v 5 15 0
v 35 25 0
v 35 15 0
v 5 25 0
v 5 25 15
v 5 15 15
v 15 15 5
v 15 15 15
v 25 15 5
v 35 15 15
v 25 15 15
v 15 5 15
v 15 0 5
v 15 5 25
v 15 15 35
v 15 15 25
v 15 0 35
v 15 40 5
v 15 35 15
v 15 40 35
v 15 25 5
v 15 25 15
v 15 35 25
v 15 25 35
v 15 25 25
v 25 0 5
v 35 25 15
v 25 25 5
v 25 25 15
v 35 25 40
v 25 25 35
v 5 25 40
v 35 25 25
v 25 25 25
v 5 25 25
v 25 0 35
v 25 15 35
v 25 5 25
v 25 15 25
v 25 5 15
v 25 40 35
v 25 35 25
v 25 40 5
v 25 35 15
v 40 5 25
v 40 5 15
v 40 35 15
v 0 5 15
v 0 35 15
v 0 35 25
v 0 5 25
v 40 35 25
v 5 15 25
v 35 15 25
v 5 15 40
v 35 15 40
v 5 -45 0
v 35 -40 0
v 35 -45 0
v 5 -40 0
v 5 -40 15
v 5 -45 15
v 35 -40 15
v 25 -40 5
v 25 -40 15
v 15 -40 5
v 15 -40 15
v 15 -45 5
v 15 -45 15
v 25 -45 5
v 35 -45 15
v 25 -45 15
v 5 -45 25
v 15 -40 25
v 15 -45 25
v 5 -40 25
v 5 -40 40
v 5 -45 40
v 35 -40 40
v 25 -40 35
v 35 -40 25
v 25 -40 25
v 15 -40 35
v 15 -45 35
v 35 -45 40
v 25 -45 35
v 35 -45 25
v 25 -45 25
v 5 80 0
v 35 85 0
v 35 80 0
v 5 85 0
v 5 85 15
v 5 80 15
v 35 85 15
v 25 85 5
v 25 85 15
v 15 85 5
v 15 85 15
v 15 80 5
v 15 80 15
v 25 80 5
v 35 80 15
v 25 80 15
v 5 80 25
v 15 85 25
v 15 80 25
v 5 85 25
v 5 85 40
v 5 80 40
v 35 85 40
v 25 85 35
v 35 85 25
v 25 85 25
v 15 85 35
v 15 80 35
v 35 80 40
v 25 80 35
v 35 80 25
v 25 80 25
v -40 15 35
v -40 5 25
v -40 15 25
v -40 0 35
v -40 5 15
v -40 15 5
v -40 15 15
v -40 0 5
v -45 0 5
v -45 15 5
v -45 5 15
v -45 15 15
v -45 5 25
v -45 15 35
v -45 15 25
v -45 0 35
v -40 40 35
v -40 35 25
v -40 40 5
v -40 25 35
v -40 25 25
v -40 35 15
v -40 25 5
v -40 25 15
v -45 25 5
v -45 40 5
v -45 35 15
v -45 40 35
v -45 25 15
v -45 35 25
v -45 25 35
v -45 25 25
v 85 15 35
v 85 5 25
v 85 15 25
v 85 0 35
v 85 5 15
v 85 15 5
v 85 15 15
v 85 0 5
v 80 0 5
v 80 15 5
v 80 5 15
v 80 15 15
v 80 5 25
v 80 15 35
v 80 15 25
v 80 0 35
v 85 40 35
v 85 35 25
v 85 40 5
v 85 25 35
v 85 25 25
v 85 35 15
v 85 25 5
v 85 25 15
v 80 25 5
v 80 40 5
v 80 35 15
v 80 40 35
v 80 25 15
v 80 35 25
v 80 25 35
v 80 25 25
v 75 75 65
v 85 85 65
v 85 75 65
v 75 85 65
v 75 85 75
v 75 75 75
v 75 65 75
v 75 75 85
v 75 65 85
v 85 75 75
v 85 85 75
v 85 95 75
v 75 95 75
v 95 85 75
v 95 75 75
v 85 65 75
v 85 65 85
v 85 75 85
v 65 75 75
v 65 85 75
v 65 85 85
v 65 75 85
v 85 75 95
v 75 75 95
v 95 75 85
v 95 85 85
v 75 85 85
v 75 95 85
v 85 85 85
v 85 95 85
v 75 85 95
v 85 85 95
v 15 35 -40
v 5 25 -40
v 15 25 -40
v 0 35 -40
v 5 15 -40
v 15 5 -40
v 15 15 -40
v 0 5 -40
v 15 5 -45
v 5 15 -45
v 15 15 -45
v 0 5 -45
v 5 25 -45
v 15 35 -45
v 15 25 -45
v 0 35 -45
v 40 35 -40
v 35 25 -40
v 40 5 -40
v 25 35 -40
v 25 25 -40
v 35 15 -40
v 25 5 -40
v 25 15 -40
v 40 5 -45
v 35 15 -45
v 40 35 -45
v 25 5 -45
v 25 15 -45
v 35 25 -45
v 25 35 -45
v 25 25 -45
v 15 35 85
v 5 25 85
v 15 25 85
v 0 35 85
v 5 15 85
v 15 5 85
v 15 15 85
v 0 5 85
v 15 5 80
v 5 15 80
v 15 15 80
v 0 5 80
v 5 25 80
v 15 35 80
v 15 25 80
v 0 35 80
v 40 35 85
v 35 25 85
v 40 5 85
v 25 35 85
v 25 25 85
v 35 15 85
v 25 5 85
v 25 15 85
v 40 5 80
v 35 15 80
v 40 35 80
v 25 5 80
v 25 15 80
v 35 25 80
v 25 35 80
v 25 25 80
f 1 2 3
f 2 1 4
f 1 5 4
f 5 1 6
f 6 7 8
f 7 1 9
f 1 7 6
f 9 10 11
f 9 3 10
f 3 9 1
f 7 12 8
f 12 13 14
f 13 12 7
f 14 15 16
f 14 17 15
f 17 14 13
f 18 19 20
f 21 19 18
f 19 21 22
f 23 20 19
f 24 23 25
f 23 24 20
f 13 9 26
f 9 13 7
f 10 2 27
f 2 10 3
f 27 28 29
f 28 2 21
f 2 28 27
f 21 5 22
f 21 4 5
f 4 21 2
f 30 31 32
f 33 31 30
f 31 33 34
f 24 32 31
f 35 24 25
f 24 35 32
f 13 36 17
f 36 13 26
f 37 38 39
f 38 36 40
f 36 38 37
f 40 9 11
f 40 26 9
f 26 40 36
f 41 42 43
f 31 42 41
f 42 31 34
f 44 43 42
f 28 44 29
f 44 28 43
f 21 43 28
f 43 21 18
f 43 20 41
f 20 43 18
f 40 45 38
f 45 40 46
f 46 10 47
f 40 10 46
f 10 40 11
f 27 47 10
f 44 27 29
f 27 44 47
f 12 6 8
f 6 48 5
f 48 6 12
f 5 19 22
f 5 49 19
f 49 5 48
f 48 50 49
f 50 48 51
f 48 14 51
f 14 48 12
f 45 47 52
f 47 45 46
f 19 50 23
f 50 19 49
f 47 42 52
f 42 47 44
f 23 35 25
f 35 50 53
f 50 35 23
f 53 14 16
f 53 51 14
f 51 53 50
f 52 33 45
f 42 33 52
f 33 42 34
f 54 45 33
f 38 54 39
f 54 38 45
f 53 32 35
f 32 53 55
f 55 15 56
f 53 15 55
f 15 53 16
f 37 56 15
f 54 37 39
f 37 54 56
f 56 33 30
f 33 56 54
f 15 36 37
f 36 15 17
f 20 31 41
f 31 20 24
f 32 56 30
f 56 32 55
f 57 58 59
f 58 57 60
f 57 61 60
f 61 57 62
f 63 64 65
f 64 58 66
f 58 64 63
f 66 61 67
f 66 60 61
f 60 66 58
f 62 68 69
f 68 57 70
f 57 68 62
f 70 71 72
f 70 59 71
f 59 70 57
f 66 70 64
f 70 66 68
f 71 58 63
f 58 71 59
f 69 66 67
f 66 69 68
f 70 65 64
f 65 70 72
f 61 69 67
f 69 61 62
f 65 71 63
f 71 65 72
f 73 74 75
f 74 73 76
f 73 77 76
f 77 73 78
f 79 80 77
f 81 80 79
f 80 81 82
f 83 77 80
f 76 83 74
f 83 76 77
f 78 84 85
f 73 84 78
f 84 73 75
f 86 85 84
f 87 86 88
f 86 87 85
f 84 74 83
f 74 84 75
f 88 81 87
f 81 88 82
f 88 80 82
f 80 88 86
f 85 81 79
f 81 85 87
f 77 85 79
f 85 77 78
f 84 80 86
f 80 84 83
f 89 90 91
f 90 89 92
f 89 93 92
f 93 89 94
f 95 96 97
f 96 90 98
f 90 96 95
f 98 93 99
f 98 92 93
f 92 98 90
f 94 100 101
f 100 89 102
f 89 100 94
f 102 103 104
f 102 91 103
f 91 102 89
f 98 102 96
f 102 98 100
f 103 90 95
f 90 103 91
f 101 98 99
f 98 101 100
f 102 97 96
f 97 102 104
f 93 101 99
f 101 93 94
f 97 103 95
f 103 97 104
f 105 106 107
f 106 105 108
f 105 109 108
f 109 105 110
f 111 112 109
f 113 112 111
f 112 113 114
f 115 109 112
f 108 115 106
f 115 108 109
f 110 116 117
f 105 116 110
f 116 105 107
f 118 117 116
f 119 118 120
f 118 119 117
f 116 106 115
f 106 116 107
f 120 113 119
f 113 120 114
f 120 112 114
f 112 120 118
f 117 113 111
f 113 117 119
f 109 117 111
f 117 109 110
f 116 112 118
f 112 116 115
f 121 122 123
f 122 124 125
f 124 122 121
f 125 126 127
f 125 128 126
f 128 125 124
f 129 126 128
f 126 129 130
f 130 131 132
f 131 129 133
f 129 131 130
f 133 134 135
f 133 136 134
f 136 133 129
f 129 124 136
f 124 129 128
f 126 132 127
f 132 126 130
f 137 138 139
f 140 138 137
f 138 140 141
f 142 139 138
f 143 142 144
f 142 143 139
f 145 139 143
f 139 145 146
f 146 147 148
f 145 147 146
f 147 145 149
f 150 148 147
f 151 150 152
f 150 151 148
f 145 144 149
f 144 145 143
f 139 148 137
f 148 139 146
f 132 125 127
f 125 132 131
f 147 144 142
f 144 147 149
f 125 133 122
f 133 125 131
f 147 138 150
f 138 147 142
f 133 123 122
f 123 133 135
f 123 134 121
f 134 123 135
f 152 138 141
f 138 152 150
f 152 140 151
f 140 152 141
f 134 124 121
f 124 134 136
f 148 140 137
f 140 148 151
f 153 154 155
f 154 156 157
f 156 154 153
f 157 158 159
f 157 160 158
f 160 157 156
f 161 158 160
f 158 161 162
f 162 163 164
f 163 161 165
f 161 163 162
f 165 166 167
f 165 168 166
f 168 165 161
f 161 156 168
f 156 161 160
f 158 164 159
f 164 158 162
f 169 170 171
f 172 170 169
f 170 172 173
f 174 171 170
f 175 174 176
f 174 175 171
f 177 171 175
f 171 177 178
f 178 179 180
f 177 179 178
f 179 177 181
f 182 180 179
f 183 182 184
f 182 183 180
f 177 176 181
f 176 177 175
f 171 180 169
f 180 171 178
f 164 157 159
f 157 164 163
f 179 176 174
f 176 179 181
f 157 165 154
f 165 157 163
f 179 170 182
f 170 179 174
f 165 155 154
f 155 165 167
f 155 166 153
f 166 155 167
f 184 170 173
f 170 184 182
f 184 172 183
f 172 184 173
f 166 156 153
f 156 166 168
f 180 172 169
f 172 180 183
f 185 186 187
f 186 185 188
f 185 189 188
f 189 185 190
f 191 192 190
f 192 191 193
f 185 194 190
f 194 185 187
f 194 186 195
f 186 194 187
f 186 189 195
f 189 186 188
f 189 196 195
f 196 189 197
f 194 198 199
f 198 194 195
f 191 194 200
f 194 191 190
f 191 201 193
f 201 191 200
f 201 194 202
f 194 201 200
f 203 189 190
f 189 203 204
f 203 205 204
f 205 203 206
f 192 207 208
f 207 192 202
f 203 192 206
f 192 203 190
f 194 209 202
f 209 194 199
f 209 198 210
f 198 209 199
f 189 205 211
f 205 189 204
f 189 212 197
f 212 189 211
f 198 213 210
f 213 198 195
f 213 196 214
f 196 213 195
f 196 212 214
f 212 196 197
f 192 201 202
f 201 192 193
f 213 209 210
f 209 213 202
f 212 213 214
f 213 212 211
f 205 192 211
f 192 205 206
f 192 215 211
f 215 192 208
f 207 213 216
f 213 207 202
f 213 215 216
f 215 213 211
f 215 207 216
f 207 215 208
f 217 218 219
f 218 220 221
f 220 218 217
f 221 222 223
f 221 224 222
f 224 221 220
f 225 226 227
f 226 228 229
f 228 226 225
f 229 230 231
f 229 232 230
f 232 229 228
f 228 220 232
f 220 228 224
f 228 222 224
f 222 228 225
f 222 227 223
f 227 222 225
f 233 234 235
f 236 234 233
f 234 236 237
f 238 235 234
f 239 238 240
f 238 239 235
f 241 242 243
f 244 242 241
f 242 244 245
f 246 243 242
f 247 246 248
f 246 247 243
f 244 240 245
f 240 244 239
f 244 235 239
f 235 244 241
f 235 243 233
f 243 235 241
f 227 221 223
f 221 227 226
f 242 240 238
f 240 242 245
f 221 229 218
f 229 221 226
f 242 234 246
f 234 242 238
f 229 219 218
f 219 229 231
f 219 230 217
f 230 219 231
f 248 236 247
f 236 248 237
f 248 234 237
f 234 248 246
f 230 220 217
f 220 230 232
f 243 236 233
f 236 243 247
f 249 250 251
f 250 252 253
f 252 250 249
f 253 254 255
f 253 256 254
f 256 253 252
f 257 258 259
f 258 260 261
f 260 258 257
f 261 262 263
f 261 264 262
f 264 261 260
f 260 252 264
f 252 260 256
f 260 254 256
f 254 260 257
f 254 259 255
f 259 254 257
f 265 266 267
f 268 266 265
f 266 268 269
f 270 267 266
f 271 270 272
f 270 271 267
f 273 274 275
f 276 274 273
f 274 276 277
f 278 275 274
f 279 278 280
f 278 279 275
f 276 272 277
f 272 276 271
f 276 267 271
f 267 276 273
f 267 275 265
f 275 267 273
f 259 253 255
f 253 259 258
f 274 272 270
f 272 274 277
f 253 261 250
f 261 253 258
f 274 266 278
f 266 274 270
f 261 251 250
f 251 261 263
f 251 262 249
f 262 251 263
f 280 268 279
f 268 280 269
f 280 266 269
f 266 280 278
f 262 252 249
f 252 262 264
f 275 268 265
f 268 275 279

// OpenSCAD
// SCAD file for Six Piece Burr Puzzle
// 整体模型
union() {
  translate([5, 15, 0]) color([0, 0.8, 0, 0.85]) cube([5, 5, 5]);
  translate([10, 15, 0]) color([0, 0.8, 0, 0.85]) cube([5, 5, 5]);
  translate([15, 15, 0]) color([0, 0.8, 0, 0.85]) cube([5, 5, 5]);
  translate([20, 15, 0]) color([0, 0.8, 0, 0.85]) cube([5, 5, 5]);
  translate([25, 15, 0]) color([0, 0.8, 0, 0.85]) cube([5, 5, 5]);
  translate([30, 15, 0]) color([0, 0.8, 0, 0.85]) cube([5, 5, 5]);
  translate([5, 20, 0]) color([1, 0, 0, 0.85]) cube([5, 5, 5]);
  translate([10, 20, 0]) color([1, 0, 0, 0.85]) cube([5, 5, 5]);
  translate([15, 20, 0]) color([1, 0, 0, 0.85]) cube([5, 5, 5]);
  translate([20, 20, 0]) color([1, 0, 0, 0.85]) cube([5, 5, 5]);
  translate([25, 20, 0]) color([1, 0, 0, 0.85]) cube([5, 5, 5]);
  translate([30, 20, 0]) color([1, 0, 0, 0.85]) cube([5, 5, 5]);
  translate([15, 0, 5]) color([0.6, 0, 1, 0.85]) cube([5, 5, 5]);
  translate([20, 0, 5]) color([1, 0.4, 0, 0.85]) cube([5, 5, 5]);
  translate([15, 5, 5]) color([0.6, 0, 1, 0.85]) cube([5, 5, 5]);
  translate([20, 5, 5]) color([1, 0.4, 0, 0.85]) cube([5, 5, 5]);
  translate([15, 10, 5]) color([0.6, 0, 1, 0.85]) cube([5, 5, 5]);
  translate([20, 10, 5]) color([1, 0.4, 0, 0.85]) cube([5, 5, 5]);
  translate([5, 15, 5]) color([0, 0.8, 0, 0.85]) cube([5, 5, 5]);
  translate([10, 15, 5]) color([0, 0.8, 0, 0.85]) cube([5, 5, 5]);
  translate([15, 15, 5]) color([0.8, 0.8, 0.8, 0.85]) cube([5, 5, 5]);
  translate([20, 15, 5]) color([0.8, 0.8, 0.8, 0.85]) cube([5, 5, 5]);
  translate([25, 15, 5]) color([0, 0.8, 0, 0.85]) cube([5, 5, 5]);
  translate([30, 15, 5]) color([0, 0.8, 0, 0.85]) cube([5, 5, 5]);
  translate([5, 20, 5]) color([1, 0, 0, 0.85]) cube([5, 5, 5]);
  translate([10, 20, 5]) color([1, 0, 0, 0.85]) cube([5, 5, 5]);
  translate([15, 20, 5]) color([0.8, 0.8, 0.8, 0.85]) cube([5, 5, 5]);
  translate([20, 20, 5]) color([0.8, 0.8, 0.8, 0.85]) cube([5, 5, 5]);
  translate([25, 20, 5]) color([1, 0, 0, 0.85]) cube([5, 5, 5]);
  translate([30, 20, 5]) color([1, 0, 0, 0.85]) cube([5, 5, 5]);
  translate([15, 25, 5]) color([0.6, 0, 1, 0.85]) cube([5, 5, 5]);
  translate([20, 25, 5]) color([1, 0.4, 0, 0.85]) cube([5, 5, 5]);
  translate([15, 30, 5]) color([0.6, 0, 1, 0.85]) cube([5, 5, 5]);
  translate([20, 30, 5]) color([1, 0.4, 0, 0.85]) cube([5, 5, 5]);
  translate([15, 35, 5]) color([0.6, 0, 1, 0.85]) cube([5, 5, 5]);
  translate([20, 35, 5]) color([1, 0.4, 0, 0.85]) cube([5, 5, 5]);
  translate([15, 0, 10]) color([0.6, 0, 1, 0.85]) cube([5, 5, 5]);
  translate([20, 0, 10]) color([1, 0.4, 0, 0.85]) cube([5, 5, 5]);
  translate([15, 5, 10]) color([0.6, 0, 1, 0.85]) cube([5, 5, 5]);
  translate([20, 5, 10]) color([1, 0.4, 0, 0.85]) cube([5, 5, 5]);
  translate([15, 10, 10]) color([0.6, 0, 1, 0.85]) cube([5, 5, 5]);
  translate([20, 10, 10]) color([1, 0.4, 0, 0.85]) cube([5, 5, 5]);
  translate([5, 15, 10]) color([0, 0.8, 0, 0.85]) cube([5, 5, 5]);
  translate([10, 15, 10]) color([0, 0.8, 0, 0.85]) cube([5, 5, 5]);
  translate([15, 15, 10]) color([0.8, 0.8, 0.8, 0.85]) cube([5, 5, 5]);
  translate([20, 15, 10]) color([0.8, 0.8, 0.8, 0.85]) cube([5, 5, 5]);
  translate([25, 15, 10]) color([0, 0.8, 0, 0.85]) cube([5, 5, 5]);
  translate([30, 15, 10]) color([0, 0.8, 0, 0.85]) cube([5, 5, 5]);
  translate([5, 20, 10]) color([1, 0, 0, 0.85]) cube([5, 5, 5]);
  translate([10, 20, 10]) color([1, 0, 0, 0.85]) cube([5, 5, 5]);
  translate([15, 20, 10]) color([0.8, 0.8, 0.8, 0.85]) cube([5, 5, 5]);
  translate([20, 20, 10]) color([0.8, 0.8, 0.8, 0.85]) cube([5, 5, 5]);
  translate([25, 20, 10]) color([1, 0, 0, 0.85]) cube([5, 5, 5]);
  translate([30, 20, 10]) color([1, 0, 0, 0.85]) cube([5, 5, 5]);
  translate([15, 25, 10]) color([0.6, 0, 1, 0.85]) cube([5, 5, 5]);
  translate([20, 25, 10]) color([1, 0.4, 0, 0.85]) cube([5, 5, 5]);
  translate([15, 30, 10]) color([0.6, 0, 1, 0.85]) cube([5, 5, 5]);
  translate([20, 30, 10]) color([1, 0.4, 0, 0.85]) cube([5, 5, 5]);
  translate([15, 35, 10]) color([0.6, 0, 1, 0.85]) cube([5, 5, 5]);
  translate([20, 35, 10]) color([1, 0.4, 0, 0.85]) cube([5, 5, 5]);
  translate([15, 0, 15]) color([0.6, 0, 1, 0.85]) cube([5, 5, 5]);
  translate([20, 0, 15]) color([1, 0.4, 0, 0.85]) cube([5, 5, 5]);
  translate([0, 5, 15]) color([1, 0.8, 0, 0.85]) cube([5, 5, 5]);
  translate([5, 5, 15]) color([1, 0.8, 0, 0.85]) cube([5, 5, 5]);
  translate([10, 5, 15]) color([1, 0.8, 0, 0.85]) cube([5, 5, 5]);
  translate([15, 5, 15]) color([0.8, 0.8, 0.8, 0.85]) cube([5, 5, 5]);
  translate([20, 5, 15]) color([0.8, 0.8, 0.8, 0.85]) cube([5, 5, 5]);
  translate([25, 5, 15]) color([1, 0.8, 0, 0.85]) cube([5, 5, 5]);
  translate([30, 5, 15]) color([1, 0.8, 0, 0.85]) cube([5, 5, 5]);
  translate([35, 5, 15]) color([1, 0.8, 0, 0.85]) cube([5, 5, 5]);
  translate([0, 10, 15]) color([1, 0.8, 0, 0.85]) cube([5, 5, 5]);
  translate([5, 10, 15]) color([1, 0.8, 0, 0.85]) cube([5, 5, 5]);
  translate([10, 10, 15]) color([1, 0.8, 0, 0.85]) cube([5, 5, 5]);
  translate([15, 10, 15]) color([0.8, 0.8, 0.8, 0.85]) cube([5, 5, 5]);
  translate([20, 10, 15]) color([0.8, 0.8, 0.8, 0.85]) cube([5, 5, 5]);
  translate([25, 10, 15]) color([1, 0.8, 0, 0.85]) cube([5, 5, 5]);
  translate([30, 10, 15]) color([1, 0.8, 0, 0.85]) cube([5, 5, 5]);
  translate([35, 10, 15]) color([1, 0.8, 0, 0.85]) cube([5, 5, 5]);
  translate([0, 15, 15]) color([1, 0.8, 0, 0.85]) cube([5, 5, 5]);
  translate([5, 15, 15]) color([0.8, 0.8, 0.8, 0.85]) cube([5, 5, 5]);
  translate([10, 15, 15]) color([0.8, 0.8, 0.8, 0.85]) cube([5, 5, 5]);
  translate([15, 15, 15]) color([0.8, 0.8, 0.8, 0.85]) cube([5, 5, 5]);
  translate([20, 15, 15]) color([0.8, 0.8, 0.8, 0.85]) cube([5, 5, 5]);
  translate([25, 15, 15]) color([0.8, 0.8, 0.8, 0.85]) cube([5, 5, 5]);
  translate([30, 15, 15]) color([0.8, 0.8, 0.8, 0.85]) cube([5, 5, 5]);
  translate([35, 15, 15]) color([1, 0.8, 0, 0.85]) cube([5, 5, 5]);
  translate([0, 20, 15]) color([1, 0.8, 0, 0.85]) cube([5, 5, 5]);
  translate([5, 20, 15]) color([0.8, 0.8, 0.8, 0.85]) cube([5, 5, 5]);
  translate([10, 20, 15]) color([0.8, 0.8, 0.8, 0.85]) cube([5, 5, 5]);
  translate([15, 20, 15]) color([0.8, 0.8, 0.8, 0.85]) cube([5, 5, 5]);
  translate([20, 20, 15]) color([0.8, 0.8, 0.8, 0.85]) cube([5, 5, 5]);
  translate([25, 20, 15]) color([0.8, 0.8, 0.8, 0.85]) cube([5, 5, 5]);
  translate([30, 20, 15]) color([0.8, 0.8, 0.8, 0.85]) cube([5, 5, 5]);
  translate([35, 20, 15]) color([1, 0.8, 0, 0.85]) cube([5, 5, 5]);
  translate([0, 25, 15]) color([1, 0.8, 0, 0.85]) cube([5, 5, 5]);
  translate([5, 25, 15]) color([1, 0.8, 0, 0.85]) cube([5, 5, 5]);
  translate([10, 25, 15]) color([1, 0.8, 0, 0.85]) cube([5, 5, 5]);
  translate([15, 25, 15]) color([0.8, 0.8, 0.8, 0.85]) cube([5, 5, 5]);
  translate([20, 25, 15]) color([0.8, 0.8, 0.8, 0.85]) cube([5, 5, 5]);
  translate([25, 25, 15]) color([1, 0.8, 0, 0.85]) cube([5, 5, 5]);
  translate([30, 25, 15]) color([1, 0.8, 0, 0.85]) cube([5, 5, 5]);
  translate([35, 25, 15]) color([1, 0.8, 0, 0.85]) cube([5, 5, 5]);
  translate([0, 30, 15]) color([1, 0.8, 0, 0.85]) cube([5, 5, 5]);
  translate([5, 30, 15]) color([1, 0.8, 0, 0.85]) cube([5, 5, 5]);
  translate([10, 30, 15]) color([1, 0.8, 0, 0.85]) cube([5, 5, 5]);
  translate([15, 30, 15]) color([0.8, 0.8, 0.8, 0.85]) cube([5, 5, 5]);
  translate([20, 30, 15]) color([0.8, 0.8, 0.8, 0.85]) cube([5, 5, 5]);
  translate([25, 30, 15]) color([1, 0.8, 0, 0.85]) cube([5, 5, 5]);
  translate([30, 30, 15]) color([1, 0.8, 0, 0.85]) cube([5, 5, 5]);
  translate([35, 30, 15]) color([1, 0.8, 0, 0.85]) cube([5, 5, 5]);
  translate([15, 35, 15]) color([0.6, 0, 1, 0.85]) cube([5, 5, 5]);
  translate([20, 35, 15]) color([1, 0.4, 0, 0.85]) cube([5, 5, 5]);
  translate([15, 0, 20]) color([0.6, 0, 1, 0.85]) cube([5, 5, 5]);
  translate([20, 0, 20]) color([1, 0.4, 0, 0.85]) cube([5, 5, 5]);
  translate([0, 5, 20]) color([0, 0.4, 1, 0.85]) cube([5, 5, 5]);
  translate([5, 5, 20]) color([0, 0.4, 1, 0.85]) cube([5, 5, 5]);
  translate([10, 5, 20]) color([0, 0.4, 1, 0.85]) cube([5, 5, 5]);
  translate([15, 5, 20]) color([0.8, 0.8, 0.8, 0.85]) cube([5, 5, 5]);
  translate([20, 5, 20]) color([0.8, 0.8, 0.8, 0.85]) cube([5, 5, 5]);
  translate([25, 5, 20]) color([0, 0.4, 1, 0.85]) cube([5, 5, 5]);
  translate([30, 5, 20]) color([0, 0.4, 1, 0.85]) cube([5, 5, 5]);
  translate([35, 5, 20]) color([0, 0.4, 1, 0.85]) cube([5, 5, 5]);
  translate([0, 10, 20]) color([0, 0.4, 1, 0.85]) cube([5, 5, 5]);
  translate([5, 10, 20]) color([0, 0.4, 1, 0.85]) cube([5, 5, 5]);
  translate([10, 10, 20]) color([0, 0.4, 1, 0.85]) cube([5, 5, 5]);
  translate([15, 10, 20]) color([0.8, 0.8, 0.8, 0.85]) cube([5, 5, 5]);
  translate([20, 10, 20]) color([0.8, 0.8, 0.8, 0.85]) cube([5, 5, 5]);
  translate([25, 10, 20]) color([0, 0.4, 1, 0.85]) cube([5, 5, 5]);
  translate([30, 10, 20]) color([0, 0.4, 1, 0.85]) cube([5, 5, 5]);
  translate([35, 10, 20]) color([0, 0.4, 1, 0.85]) cube([5, 5, 5]);
  translate([0, 15, 20]) color([0, 0.4, 1, 0.85]) cube([5, 5, 5]);
  translate([5, 15, 20]) color([0.8, 0.8, 0.8, 0.85]) cube([5, 5, 5]);
  translate([10, 15, 20]) color([0.8, 0.8, 0.8, 0.85]) cube([5, 5, 5]);
  translate([15, 15, 20]) color([0.8, 0.8, 0.8, 0.85]) cube([5, 5, 5]);
  translate([20, 15, 20]) color([0.8, 0.8, 0.8, 0.85]) cube([5, 5, 5]);
  translate([25, 15, 20]) color([0.8, 0.8, 0.8, 0.85]) cube([5, 5, 5]);
  translate([30, 15, 20]) color([0.8, 0.8, 0.8, 0.85]) cube([5, 5, 5]);
  translate([35, 15, 20]) color([0, 0.4, 1, 0.85]) cube([5, 5, 5]);
  translate([0, 20, 20]) color([0, 0.4, 1, 0.85]) cube([5, 5, 5]);
  translate([5, 20, 20]) color([0.8, 0.8, 0.8, 0.85]) cube([5, 5, 5]);
  translate([10, 20, 20]) color([0.8, 0.8, 0.8, 0.85]) cube([5, 5, 5]);
  translate([15, 20, 20]) color([0.8, 0.8, 0.8, 0.85]) cube([5, 5, 5]);
  translate([20, 20, 20]) color([0.8, 0.8, 0.8, 0.85]) cube([5, 5, 5]);
  translate([25, 20, 20]) color([0.8, 0.8, 0.8, 0.85]) cube([5, 5, 5]);
  translate([30, 20, 20]) color([0.8, 0.8, 0.8, 0.85]) cube([5, 5, 5]);
  translate([35, 20, 20]) color([0, 0.4, 1, 0.85]) cube([5, 5, 5]);
  translate([0, 25, 20]) color([0, 0.4, 1, 0.85]) cube([5, 5, 5]);
  translate([5, 25, 20]) color([0, 0.4, 1, 0.85]) cube([5, 5, 5]);
  translate([10, 25, 20]) color([0, 0.4, 1, 0.85]) cube([5, 5, 5]);
  translate([15, 25, 20]) color([0.8, 0.8, 0.8, 0.85]) cube([5, 5, 5]);
  translate([20, 25, 20]) color([0.8, 0.8, 0.8, 0.85]) cube([5, 5, 5]);
  translate([25, 25, 20]) color([0, 0.4, 1, 0.85]) cube([5, 5, 5]);
  translate([30, 25, 20]) color([0, 0.4, 1, 0.85]) cube([5, 5, 5]);
  translate([35, 25, 20]) color([0, 0.4, 1, 0.85]) cube([5, 5, 5]);
  translate([0, 30, 20]) color([0, 0.4, 1, 0.85]) cube([5, 5, 5]);
  translate([5, 30, 20]) color([0, 0.4, 1, 0.85]) cube([5, 5, 5]);
  translate([10, 30, 20]) color([0, 0.4, 1, 0.85]) cube([5, 5, 5]);
  translate([15, 30, 20]) color([0.8, 0.8, 0.8, 0.85]) cube([5, 5, 5]);
  translate([20, 30, 20]) color([0.8, 0.8, 0.8, 0.85]) cube([5, 5, 5]);
  translate([25, 30, 20]) color([0, 0.4, 1, 0.85]) cube([5, 5, 5]);
  translate([30, 30, 20]) color([0, 0.4, 1, 0.85]) cube([5, 5, 5]);
  translate([35, 30, 20]) color([0, 0.4, 1, 0.85]) cube([5, 5, 5]);
  translate([15, 35, 20]) color([0.6, 0, 1, 0.85]) cube([5, 5, 5]);
  translate([20, 35, 20]) color([1, 0.4, 0, 0.85]) cube([5, 5, 5]);
  translate([15, 0, 25]) color([0.6, 0, 1, 0.85]) cube([5, 5, 5]);
  translate([20, 0, 25]) color([1, 0.4, 0, 0.85]) cube([5, 5, 5]);
  translate([15, 5, 25]) color([0.6, 0, 1, 0.85]) cube([5, 5, 5]);
  translate([20, 5, 25]) color([1, 0.4, 0, 0.85]) cube([5, 5, 5]);
  translate([15, 10, 25]) color([0.6, 0, 1, 0.85]) cube([5, 5, 5]);
  translate([20, 10, 25]) color([1, 0.4, 0, 0.85]) cube([5, 5, 5]);
  translate([5, 15, 25]) color([0, 0.8, 0, 0.85]) cube([5, 5, 5]);
  translate([10, 15, 25]) color([0, 0.8, 0, 0.85]) cube([5, 5, 5]);
  translate([15, 15, 25]) color([0.8, 0.8, 0.8, 0.85]) cube([5, 5, 5]);
  translate([20, 15, 25]) color([0.8, 0.8, 0.8, 0.85]) cube([5, 5, 5]);
  translate([25, 15, 25]) color([0, 0.8, 0, 0.85]) cube([5, 5, 5]);
  translate([30, 15, 25]) color([0, 0.8, 0, 0.85]) cube([5, 5, 5]);
  translate([5, 20, 25]) color([1, 0, 0, 0.85]) cube([5, 5, 5]);
  translate([10, 20, 25]) color([1, 0, 0, 0.85]) cube([5, 5, 5]);
  translate([15, 20, 25]) color([0.8, 0.8, 0.8, 0.85]) cube([5, 5, 5]);
  translate([20, 20, 25]) color([0.8, 0.8, 0.8, 0.85]) cube([5, 5, 5]);
  translate([25, 20, 25]) color([1, 0, 0, 0.85]) cube([5, 5, 5]);
  translate([30, 20, 25]) color([1, 0, 0, 0.85]) cube([5, 5, 5]);
  translate([15, 25, 25]) color([0.6, 0, 1, 0.85]) cube([5, 5, 5]);
  translate([20, 25, 25]) color([1, 0.4, 0, 0.85]) cube([5, 5, 5]);
  translate([15, 30, 25]) color([0.6, 0, 1, 0.85]) cube([5, 5, 5]);
  translate([20, 30, 25]) color([1, 0.4, 0, 0.85]) cube([5, 5, 5]);
  translate([15, 35, 25]) color([0.6, 0, 1, 0.85]) cube([5, 5, 5]);
  translate([20, 35, 25]) color([1, 0.4, 0, 0.85]) cube([5, 5, 5]);
  translate([15, 0, 30]) color([0.6, 0, 1, 0.85]) cube([5, 5, 5]);
  translate([20, 0, 30]) color([1, 0.4, 0, 0.85]) cube([5, 5, 5]);
  translate([15, 5, 30]) color([0.6, 0, 1, 0.85]) cube([5, 5, 5]);
  translate([20, 5, 30]) color([1, 0.4, 0, 0.85]) cube([5, 5, 5]);
  translate([15, 10, 30]) color([0.6, 0, 1, 0.85]) cube([5, 5, 5]);
  translate([20, 10, 30]) color([1, 0.4, 0, 0.85]) cube([5, 5, 5]);
  translate([5, 15, 30]) color([0, 0.8, 0, 0.85]) cube([5, 5, 5]);
  translate([10, 15, 30]) color([0, 0.8, 0, 0.85]) cube([5, 5, 5]);
  translate([15, 15, 30]) color([0.8, 0.8, 0.8, 0.85]) cube([5, 5, 5]);
  translate([20, 15, 30]) color([0.8, 0.8, 0.8, 0.85]) cube([5, 5, 5]);
  translate([25, 15, 30]) color([0, 0.8, 0, 0.85]) cube([5, 5, 5]);
  translate([30, 15, 30]) color([0, 0.8, 0, 0.85]) cube([5, 5, 5]);
  translate([5, 20, 30]) color([1, 0, 0, 0.85]) cube([5, 5, 5]);
  translate([10, 20, 30]) color([1, 0, 0, 0.85]) cube([5, 5, 5]);
  translate([15, 20, 30]) color([0.8, 0.8, 0.8, 0.85]) cube([5, 5, 5]);
  translate([20, 20, 30]) color([0.8, 0.8, 0.8, 0.85]) cube([5, 5, 5]);
  translate([25, 20, 30]) color([1, 0, 0, 0.85]) cube([5, 5, 5]);
  translate([30, 20, 30]) color([1, 0, 0, 0.85]) cube([5, 5, 5]);
  translate([15, 25, 30]) color([0.6, 0, 1, 0.85]) cube([5, 5, 5]);
  translate([20, 25, 30]) color([1, 0.4, 0, 0.85]) cube([5, 5, 5]);
  translate([15, 30, 30]) color([0.6, 0, 1, 0.85]) cube([5, 5, 5]);
  translate([20, 30, 30]) color([1, 0.4, 0, 0.85]) cube([5, 5, 5]);
  translate([15, 35, 30]) color([0.6, 0, 1, 0.85]) cube([5, 5, 5]);
  translate([20, 35, 30]) color([1, 0.4, 0, 0.85]) cube([5, 5, 5]);
  translate([5, 15, 35]) color([0, 0.8, 0, 0.85]) cube([5, 5, 5]);
  translate([10, 15, 35]) color([0, 0.8, 0, 0.85]) cube([5, 5, 5]);
  translate([15, 15, 35]) color([0, 0.8, 0, 0.85]) cube([5, 5, 5]);
  translate([20, 15, 35]) color([0, 0.8, 0, 0.85]) cube([5, 5, 5]);
  translate([25, 15, 35]) color([0, 0.8, 0, 0.85]) cube([5, 5, 5]);
  translate([30, 15, 35]) color([0, 0.8, 0, 0.85]) cube([5, 5, 5]);
  translate([5, 20, 35]) color([1, 0, 0, 0.85]) cube([5, 5, 5]);
  translate([10, 20, 35]) color([1, 0, 0, 0.85]) cube([5, 5, 5]);
  translate([15, 20, 35]) color([1, 0, 0, 0.85]) cube([5, 5, 5]);
  translate([20, 20, 35]) color([1, 0, 0, 0.85]) cube([5, 5, 5]);
  translate([25, 20, 35]) color([1, 0, 0, 0.85]) cube([5, 5, 5]);
  translate([30, 20, 35]) color([1, 0, 0, 0.85]) cube([5, 5, 5]);
}

// 零件 B
union() {
  translate([5.0, -45.0, 0.0]) color([0, 0.8, 0, 0.85]) cube([5, 5, 5]);
  translate([10.0, -45.0, 0.0]) color([0, 0.8, 0, 0.85]) cube([5, 5, 5]);
  translate([15.0, -45.0, 0.0]) color([0, 0.8, 0, 0.85]) cube([5, 5, 5]);
  translate([20.0, -45.0, 0.0]) color([0, 0.8, 0, 0.85]) cube([5, 5, 5]);
  translate([25.0, -45.0, 0.0]) color([0, 0.8, 0, 0.85]) cube([5, 5, 5]);
  translate([30.0, -45.0, 0.0]) color([0, 0.8, 0, 0.85]) cube([5, 5, 5]);
  translate([5.0, -45.0, 5.0]) color([0, 0.8, 0, 0.85]) cube([5, 5, 5]);
  translate([10.0, -45.0, 5.0]) color([0, 0.8, 0, 0.85]) cube([5, 5, 5]);
  translate([25.0, -45.0, 5.0]) color([0, 0.8, 0, 0.85]) cube([5, 5, 5]);
  translate([30.0, -45.0, 5.0]) color([0, 0.8, 0, 0.85]) cube([5, 5, 5]);
  translate([5.0, -45.0, 10.0]) color([0, 0.8, 0, 0.85]) cube([5, 5, 5]);
  translate([10.0, -45.0, 10.0]) color([0, 0.8, 0, 0.85]) cube([5, 5, 5]);
  translate([25.0, -45.0, 10.0]) color([0, 0.8, 0, 0.85]) cube([5, 5, 5]);
  translate([30.0, -45.0, 10.0]) color([0, 0.8, 0, 0.85]) cube([5, 5, 5]);
  translate([5.0, -45.0, 25.0]) color([0, 0.8, 0, 0.85]) cube([5, 5, 5]);
  translate([10.0, -45.0, 25.0]) color([0, 0.8, 0, 0.85]) cube([5, 5, 5]);
  translate([25.0, -45.0, 25.0]) color([0, 0.8, 0, 0.85]) cube([5, 5, 5]);
  translate([30.0, -45.0, 25.0]) color([0, 0.8, 0, 0.85]) cube([5, 5, 5]);
  translate([5.0, -45.0, 30.0]) color([0, 0.8, 0, 0.85]) cube([5, 5, 5]);
  translate([10.0, -45.0, 30.0]) color([0, 0.8, 0, 0.85]) cube([5, 5, 5]);
  translate([25.0, -45.0, 30.0]) color([0, 0.8, 0, 0.85]) cube([5, 5, 5]);
  translate([30.0, -45.0, 30.0]) color([0, 0.8, 0, 0.85]) cube([5, 5, 5]);
  translate([5.0, -45.0, 35.0]) color([0, 0.8, 0, 0.85]) cube([5, 5, 5]);
  translate([10.0, -45.0, 35.0]) color([0, 0.8, 0, 0.85]) cube([5, 5, 5]);
  translate([15.0, -45.0, 35.0]) color([0, 0.8, 0, 0.85]) cube([5, 5, 5]);
  translate([20.0, -45.0, 35.0]) color([0, 0.8, 0, 0.85]) cube([5, 5, 5]);
  translate([25.0, -45.0, 35.0]) color([0, 0.8, 0, 0.85]) cube([5, 5, 5]);
  translate([30.0, -45.0, 35.0]) color([0, 0.8, 0, 0.85]) cube([5, 5, 5]);
}

// 零件 A
union() {
  translate([5.0, 80.0, 0.0]) color([1, 0, 0, 0.85]) cube([5, 5, 5]);
  translate([10.0, 80.0, 0.0]) color([1, 0, 0, 0.85]) cube([5, 5, 5]);
  translate([15.0, 80.0, 0.0]) color([1, 0, 0, 0.85]) cube([5, 5, 5]);
  translate([20.0, 80.0, 0.0]) color([1, 0, 0, 0.85]) cube([5, 5, 5]);
  translate([25.0, 80.0, 0.0]) color([1, 0, 0, 0.85]) cube([5, 5, 5]);
  translate([30.0, 80.0, 0.0]) color([1, 0, 0, 0.85]) cube([5, 5, 5]);
  translate([5.0, 80.0, 5.0]) color([1, 0, 0, 0.85]) cube([5, 5, 5]);
  translate([10.0, 80.0, 5.0]) color([1, 0, 0, 0.85]) cube([5, 5, 5]);
  translate([25.0, 80.0, 5.0]) color([1, 0, 0, 0.85]) cube([5, 5, 5]);
  translate([30.0, 80.0, 5.0]) color([1, 0, 0, 0.85]) cube([5, 5, 5]);
  translate([5.0, 80.0, 10.0]) color([1, 0, 0, 0.85]) cube([5, 5, 5]);
  translate([10.0, 80.0, 10.0]) color([1, 0, 0, 0.85]) cube([5, 5, 5]);
  translate([25.0, 80.0, 10.0]) color([1, 0, 0, 0.85]) cube([5, 5, 5]);
  translate([30.0, 80.0, 10.0]) color([1, 0, 0, 0.85]) cube([5, 5, 5]);
  translate([5.0, 80.0, 25.0]) color([1, 0, 0, 0.85]) cube([5, 5, 5]);
  translate([10.0, 80.0, 25.0]) color([1, 0, 0, 0.85]) cube([5, 5, 5]);
  translate([25.0, 80.0, 25.0]) color([1, 0, 0, 0.85]) cube([5, 5, 5]);
  translate([30.0, 80.0, 25.0]) color([1, 0, 0, 0.85]) cube([5, 5, 5]);
  translate([5.0, 80.0, 30.0]) color([1, 0, 0, 0.85]) cube([5, 5, 5]);
  translate([10.0, 80.0, 30.0]) color([1, 0, 0, 0.85]) cube([5, 5, 5]);
  translate([25.0, 80.0, 30.0]) color([1, 0, 0, 0.85]) cube([5, 5, 5]);
  translate([30.0, 80.0, 30.0]) color([1, 0, 0, 0.85]) cube([5, 5, 5]);
  translate([5.0, 80.0, 35.0]) color([1, 0, 0, 0.85]) cube([5, 5, 5]);
  translate([10.0, 80.0, 35.0]) color([1, 0, 0, 0.85]) cube([5, 5, 5]);
  translate([15.0, 80.0, 35.0]) color([1, 0, 0, 0.85]) cube([5, 5, 5]);
  translate([20.0, 80.0, 35.0]) color([1, 0, 0, 0.85]) cube([5, 5, 5]);
  translate([25.0, 80.0, 35.0]) color([1, 0, 0, 0.85]) cube([5, 5, 5]);
  translate([30.0, 80.0, 35.0]) color([1, 0, 0, 0.85]) cube([5, 5, 5]);
}

// 零件 F
union() {
  translate([-45.0, 0.0, 5.0]) color([0.6, 0, 1, 0.85]) cube([5, 5, 5]);
  translate([-45.0, 5.0, 5.0]) color([0.6, 0, 1, 0.85]) cube([5, 5, 5]);
  translate([-45.0, 10.0, 5.0]) color([0.6, 0, 1, 0.85]) cube([5, 5, 5]);
  translate([-45.0, 25.0, 5.0]) color([0.6, 0, 1, 0.85]) cube([5, 5, 5]);
  translate([-45.0, 30.0, 5.0]) color([0.6, 0, 1, 0.85]) cube([5, 5, 5]);
  translate([-45.0, 35.0, 5.0]) color([0.6, 0, 1, 0.85]) cube([5, 5, 5]);
  translate([-45.0, 0.0, 10.0]) color([0.6, 0, 1, 0.85]) cube([5, 5, 5]);
  translate([-45.0, 5.0, 10.0]) color([0.6, 0, 1, 0.85]) cube([5, 5, 5]);
  translate([-45.0, 10.0, 10.0]) color([0.6, 0, 1, 0.85]) cube([5, 5, 5]);
  translate([-45.0, 25.0, 10.0]) color([0.6, 0, 1, 0.85]) cube([5, 5, 5]);
  translate([-45.0, 30.0, 10.0]) color([0.6, 0, 1, 0.85]) cube([5, 5, 5]);
  translate([-45.0, 35.0, 10.0]) color([0.6, 0, 1, 0.85]) cube([5, 5, 5]);
  translate([-45.0, 0.0, 15.0]) color([0.6, 0, 1, 0.85]) cube([5, 5, 5]);
  translate([-45.0, 35.0, 15.0]) color([0.6, 0, 1, 0.85]) cube([5, 5, 5]);
  translate([-45.0, 0.0, 20.0]) color([0.6, 0, 1, 0.85]) cube([5, 5, 5]);
  translate([-45.0, 35.0, 20.0]) color([0.6, 0, 1, 0.85]) cube([5, 5, 5]);
  translate([-45.0, 0.0, 25.0]) color([0.6, 0, 1, 0.85]) cube([5, 5, 5]);
  translate([-45.0, 5.0, 25.0]) color([0.6, 0, 1, 0.85]) cube([5, 5, 5]);
  translate([-45.0, 10.0, 25.0]) color([0.6, 0, 1, 0.85]) cube([5, 5, 5]);
  translate([-45.0, 25.0, 25.0]) color([0.6, 0, 1, 0.85]) cube([5, 5, 5]);
  translate([-45.0, 30.0, 25.0]) color([0.6, 0, 1, 0.85]) cube([5, 5, 5]);
  translate([-45.0, 35.0, 25.0]) color([0.6, 0, 1, 0.85]) cube([5, 5, 5]);
  translate([-45.0, 0.0, 30.0]) color([0.6, 0, 1, 0.85]) cube([5, 5, 5]);
  translate([-45.0, 5.0, 30.0]) color([0.6, 0, 1, 0.85]) cube([5, 5, 5]);
  translate([-45.0, 10.0, 30.0]) color([0.6, 0, 1, 0.85]) cube([5, 5, 5]);
  translate([-45.0, 25.0, 30.0]) color([0.6, 0, 1, 0.85]) cube([5, 5, 5]);
  translate([-45.0, 30.0, 30.0]) color([0.6, 0, 1, 0.85]) cube([5, 5, 5]);
  translate([-45.0, 35.0, 30.0]) color([0.6, 0, 1, 0.85]) cube([5, 5, 5]);
}

// 零件 E
union() {
  translate([80.0, 0.0, 5.0]) color([1, 0.4, 0, 0.85]) cube([5, 5, 5]);
  translate([80.0, 5.0, 5.0]) color([1, 0.4, 0, 0.85]) cube([5, 5, 5]);
  translate([80.0, 10.0, 5.0]) color([1, 0.4, 0, 0.85]) cube([5, 5, 5]);
  translate([80.0, 25.0, 5.0]) color([1, 0.4, 0, 0.85]) cube([5, 5, 5]);
  translate([80.0, 30.0, 5.0]) color([1, 0.4, 0, 0.85]) cube([5, 5, 5]);
  translate([80.0, 35.0, 5.0]) color([1, 0.4, 0, 0.85]) cube([5, 5, 5]);
  translate([80.0, 0.0, 10.0]) color([1, 0.4, 0, 0.85]) cube([5, 5, 5]);
  translate([80.0, 5.0, 10.0]) color([1, 0.4, 0, 0.85]) cube([5, 5, 5]);
  translate([80.0, 10.0, 10.0]) color([1, 0.4, 0, 0.85]) cube([5, 5, 5]);
  translate([80.0, 25.0, 10.0]) color([1, 0.4, 0, 0.85]) cube([5, 5, 5]);
  translate([80.0, 30.0, 10.0]) color([1, 0.4, 0, 0.85]) cube([5, 5, 5]);
  translate([80.0, 35.0, 10.0]) color([1, 0.4, 0, 0.85]) cube([5, 5, 5]);
  translate([80.0, 0.0, 15.0]) color([1, 0.4, 0, 0.85]) cube([5, 5, 5]);
  translate([80.0, 35.0, 15.0]) color([1, 0.4, 0, 0.85]) cube([5, 5, 5]);
  translate([80.0, 0.0, 20.0]) color([1, 0.4, 0, 0.85]) cube([5, 5, 5]);
  translate([80.0, 35.0, 20.0]) color([1, 0.4, 0, 0.85]) cube([5, 5, 5]);
  translate([80.0, 0.0, 25.0]) color([1, 0.4, 0, 0.85]) cube([5, 5, 5]);
  translate([80.0, 5.0, 25.0]) color([1, 0.4, 0, 0.85]) cube([5, 5, 5]);
  translate([80.0, 10.0, 25.0]) color([1, 0.4, 0, 0.85]) cube([5, 5, 5]);
  translate([80.0, 25.0, 25.0]) color([1, 0.4, 0, 0.85]) cube([5, 5, 5]);
  translate([80.0, 30.0, 25.0]) color([1, 0.4, 0, 0.85]) cube([5, 5, 5]);
  translate([80.0, 35.0, 25.0]) color([1, 0.4, 0, 0.85]) cube([5, 5, 5]);
  translate([80.0, 0.0, 30.0]) color([1, 0.4, 0, 0.85]) cube([5, 5, 5]);
  translate([80.0, 5.0, 30.0]) color([1, 0.4, 0, 0.85]) cube([5, 5, 5]);
  translate([80.0, 10.0, 30.0]) color([1, 0.4, 0, 0.85]) cube([5, 5, 5]);
  translate([80.0, 25.0, 30.0]) color([1, 0.4, 0, 0.85]) cube([5, 5, 5]);
  translate([80.0, 30.0, 30.0]) color([1, 0.4, 0, 0.85]) cube([5, 5, 5]);
  translate([80.0, 35.0, 30.0]) color([1, 0.4, 0, 0.85]) cube([5, 5, 5]);
}

// 零件 public
union() {
  translate([75.0, 75.0, 65.0]) color([0.8, 0.8, 0.8, 0.85]) cube([5, 5, 5]);
  translate([80.0, 75.0, 65.0]) color([0.8, 0.8, 0.8, 0.85]) cube([5, 5, 5]);
  translate([75.0, 80.0, 65.0]) color([0.8, 0.8, 0.8, 0.85]) cube([5, 5, 5]);
  translate([80.0, 80.0, 65.0]) color([0.8, 0.8, 0.8, 0.85]) cube([5, 5, 5]);
  translate([75.0, 75.0, 70.0]) color([0.8, 0.8, 0.8, 0.85]) cube([5, 5, 5]);
  translate([80.0, 75.0, 70.0]) color([0.8, 0.8, 0.8, 0.85]) cube([5, 5, 5]);
  translate([75.0, 80.0, 70.0]) color([0.8, 0.8, 0.8, 0.85]) cube([5, 5, 5]);
  translate([80.0, 80.0, 70.0]) color([0.8, 0.8, 0.8, 0.85]) cube([5, 5, 5]);
  translate([75.0, 65.0, 75.0]) color([0.8, 0.8, 0.8, 0.85]) cube([5, 5, 5]);
  translate([80.0, 65.0, 75.0]) color([0.8, 0.8, 0.8, 0.85]) cube([5, 5, 5]);
  translate([75.0, 70.0, 75.0]) color([0.8, 0.8, 0.8, 0.85]) cube([5, 5, 5]);
  translate([80.0, 70.0, 75.0]) color([0.8, 0.8, 0.8, 0.85]) cube([5, 5, 5]);
  translate([65.0, 75.0, 75.0]) color([0.8, 0.8, 0.8, 0.85]) cube([5, 5, 5]);
  translate([70.0, 75.0, 75.0]) color([0.8, 0.8, 0.8, 0.85]) cube([5, 5, 5]);
  translate([75.0, 75.0, 75.0]) color([0.8, 0.8, 0.8, 0.85]) cube([5, 5, 5]);
  translate([80.0, 75.0, 75.0]) color([0.8, 0.8, 0.8, 0.85]) cube([5, 5, 5]);
  translate([85.0, 75.0, 75.0]) color([0.8, 0.8, 0.8, 0.85]) cube([5, 5, 5]);
  translate([90.0, 75.0, 75.0]) color([0.8, 0.8, 0.8, 0.85]) cube([5, 5, 5]);
  translate([65.0, 80.0, 75.0]) color([0.8, 0.8, 0.8, 0.85]) cube([5, 5, 5]);
  translate([70.0, 80.0, 75.0]) color([0.8, 0.8, 0.8, 0.85]) cube([5, 5, 5]);
  translate([75.0, 80.0, 75.0]) color([0.8, 0.8, 0.8, 0.85]) cube([5, 5, 5]);
  translate([80.0, 80.0, 75.0]) color([0.8, 0.8, 0.8, 0.85]) cube([5, 5, 5]);
  translate([85.0, 80.0, 75.0]) color([0.8, 0.8, 0.8, 0.85]) cube([5, 5, 5]);
  translate([90.0, 80.0, 75.0]) color([0.8, 0.8, 0.8, 0.85]) cube([5, 5, 5]);
  translate([75.0, 85.0, 75.0]) color([0.8, 0.8, 0.8, 0.85]) cube([5, 5, 5]);
  translate([80.0, 85.0, 75.0]) color([0.8, 0.8, 0.8, 0.85]) cube([5, 5, 5]);
  translate([75.0, 90.0, 75.0]) color([0.8, 0.8, 0.8, 0.85]) cube([5, 5, 5]);
  translate([80.0, 90.0, 75.0]) color([0.8, 0.8, 0.8, 0.85]) cube([5, 5, 5]);
  translate([75.0, 65.0, 80.0]) color([0.8, 0.8, 0.8, 0.85]) cube([5, 5, 5]);
  translate([80.0, 65.0, 80.0]) color([0.8, 0.8, 0.8, 0.85]) cube([5, 5, 5]);
  translate([75.0, 70.0, 80.0]) color([0.8, 0.8, 0.8, 0.85]) cube([5, 5, 5]);
  translate([80.0, 70.0, 80.0]) color([0.8, 0.8, 0.8, 0.85]) cube([5, 5, 5]);
  translate([65.0, 75.0, 80.0]) color([0.8, 0.8, 0.8, 0.85]) cube([5, 5, 5]);
  translate([70.0, 75.0, 80.0]) color([0.8, 0.8, 0.8, 0.85]) cube([5, 5, 5]);
  translate([75.0, 75.0, 80.0]) color([0.8, 0.8, 0.8, 0.85]) cube([5, 5, 5]);
  translate([80.0, 75.0, 80.0]) color([0.8, 0.8, 0.8, 0.85]) cube([5, 5, 5]);
  translate([85.0, 75.0, 80.0]) color([0.8, 0.8, 0.8, 0.85]) cube([5, 5, 5]);
  translate([90.0, 75.0, 80.0]) color([0.8, 0.8, 0.8, 0.85]) cube([5, 5, 5]);
  translate([65.0, 80.0, 80.0]) color([0.8, 0.8, 0.8, 0.85]) cube([5, 5, 5]);
  translate([70.0, 80.0, 80.0]) color([0.8, 0.8, 0.8, 0.85]) cube([5, 5, 5]);
  translate([75.0, 80.0, 80.0]) color([0.8, 0.8, 0.8, 0.85]) cube([5, 5, 5]);
  translate([80.0, 80.0, 80.0]) color([0.8, 0.8, 0.8, 0.85]) cube([5, 5, 5]);
  translate([85.0, 80.0, 80.0]) color([0.8, 0.8, 0.8, 0.85]) cube([5, 5, 5]);
  translate([90.0, 80.0, 80.0]) color([0.8, 0.8, 0.8, 0.85]) cube([5, 5, 5]);
  translate([75.0, 85.0, 80.0]) color([0.8, 0.8, 0.8, 0.85]) cube([5, 5, 5]);
  translate([80.0, 85.0, 80.0]) color([0.8, 0.8, 0.8, 0.85]) cube([5, 5, 5]);
  translate([75.0, 90.0, 80.0]) color([0.8, 0.8, 0.8, 0.85]) cube([5, 5, 5]);
  translate([80.0, 90.0, 80.0]) color([0.8, 0.8, 0.8, 0.85]) cube([5, 5, 5]);
  translate([75.0, 75.0, 85.0]) color([0.8, 0.8, 0.8, 0.85]) cube([5, 5, 5]);
  translate([80.0, 75.0, 85.0]) color([0.8, 0.8, 0.8, 0.85]) cube([5, 5, 5]);
  translate([75.0, 80.0, 85.0]) color([0.8, 0.8, 0.8, 0.85]) cube([5, 5, 5]);
  translate([80.0, 80.0, 85.0]) color([0.8, 0.8, 0.8, 0.85]) cube([5, 5, 5]);
  translate([75.0, 75.0, 90.0]) color([0.8, 0.8, 0.8, 0.85]) cube([5, 5, 5]);
  translate([80.0, 75.0, 90.0]) color([0.8, 0.8, 0.8, 0.85]) cube([5, 5, 5]);
  translate([75.0, 80.0, 90.0]) color([0.8, 0.8, 0.8, 0.85]) cube([5, 5, 5]);
  translate([80.0, 80.0, 90.0]) color([0.8, 0.8, 0.8, 0.85]) cube([5, 5, 5]);
}

// 零件 D
union() {
  translate([0.0, 5.0, -45.0]) color([1, 0.8, 0, 0.85]) cube([5, 5, 5]);
  translate([5.0, 5.0, -45.0]) color([1, 0.8, 0, 0.85]) cube([5, 5, 5]);
  translate([10.0, 5.0, -45.0]) color([1, 0.8, 0, 0.85]) cube([5, 5, 5]);
  translate([25.0, 5.0, -45.0]) color([1, 0.8, 0, 0.85]) cube([5, 5, 5]);
  translate([30.0, 5.0, -45.0]) color([1, 0.8, 0, 0.85]) cube([5, 5, 5]);
  translate([35.0, 5.0, -45.0]) color([1, 0.8, 0, 0.85]) cube([5, 5, 5]);
  translate([0.0, 10.0, -45.0]) color([1, 0.8, 0, 0.85]) cube([5, 5, 5]);
  translate([5.0, 10.0, -45.0]) color([1, 0.8, 0, 0.85]) cube([5, 5, 5]);
  translate([10.0, 10.0, -45.0]) color([1, 0.8, 0, 0.85]) cube([5, 5, 5]);
  translate([25.0, 10.0, -45.0]) color([1, 0.8, 0, 0.85]) cube([5, 5, 5]);
  translate([30.0, 10.0, -45.0]) color([1, 0.8, 0, 0.85]) cube([5, 5, 5]);
  translate([35.0, 10.0, -45.0]) color([1, 0.8, 0, 0.85]) cube([5, 5, 5]);
  translate([0.0, 15.0, -45.0]) color([1, 0.8, 0, 0.85]) cube([5, 5, 5]);
  translate([35.0, 15.0, -45.0]) color([1, 0.8, 0, 0.85]) cube([5, 5, 5]);
  translate([0.0, 20.0, -45.0]) color([1, 0.8, 0, 0.85]) cube([5, 5, 5]);
  translate([35.0, 20.0, -45.0]) color([1, 0.8, 0, 0.85]) cube([5, 5, 5]);
  translate([0.0, 25.0, -45.0]) color([1, 0.8, 0, 0.85]) cube([5, 5, 5]);
  translate([5.0, 25.0, -45.0]) color([1, 0.8, 0, 0.85]) cube([5, 5, 5]);
  translate([10.0, 25.0, -45.0]) color([1, 0.8, 0, 0.85]) cube([5, 5, 5]);
  translate([25.0, 25.0, -45.0]) color([1, 0.8, 0, 0.85]) cube([5, 5, 5]);
  translate([30.0, 25.0, -45.0]) color([1, 0.8, 0, 0.85]) cube([5, 5, 5]);
  translate([35.0, 25.0, -45.0]) color([1, 0.8, 0, 0.85]) cube([5, 5, 5]);
  translate([0.0, 30.0, -45.0]) color([1, 0.8, 0, 0.85]) cube([5, 5, 5]);
  translate([5.0, 30.0, -45.0]) color([1, 0.8, 0, 0.85]) cube([5, 5, 5]);
  translate([10.0, 30.0, -45.0]) color([1, 0.8, 0, 0.85]) cube([5, 5, 5]);
  translate([25.0, 30.0, -45.0]) color([1, 0.8, 0, 0.85]) cube([5, 5, 5]);
  translate([30.0, 30.0, -45.0]) color([1, 0.8, 0, 0.85]) cube([5, 5, 5]);
  translate([35.0, 30.0, -45.0]) color([1, 0.8, 0, 0.85]) cube([5, 5, 5]);
}

// 零件 C
union() {
  translate([0.0, 5.0, 80.0]) color([0, 0.4, 1, 0.85]) cube([5, 5, 5]);
  translate([5.0, 5.0, 80.0]) color([0, 0.4, 1, 0.85]) cube([5, 5, 5]);
  translate([10.0, 5.0, 80.0]) color([0, 0.4, 1, 0.85]) cube([5, 5, 5]);
  translate([25.0, 5.0, 80.0]) color([0, 0.4, 1, 0.85]) cube([5, 5, 5]);
  translate([30.0, 5.0, 80.0]) color([0, 0.4, 1, 0.85]) cube([5, 5, 5]);
  translate([35.0, 5.0, 80.0]) color([0, 0.4, 1, 0.85]) cube([5, 5, 5]);
  translate([0.0, 10.0, 80.0]) color([0, 0.4, 1, 0.85]) cube([5, 5, 5]);
  translate([5.0, 10.0, 80.0]) color([0, 0.4, 1, 0.85]) cube([5, 5, 5]);
  translate([10.0, 10.0, 80.0]) color([0, 0.4, 1, 0.85]) cube([5, 5, 5]);
  translate([25.0, 10.0, 80.0]) color([0, 0.4, 1, 0.85]) cube([5, 5, 5]);
  translate([30.0, 10.0, 80.0]) color([0, 0.4, 1, 0.85]) cube([5, 5, 5]);
  translate([35.0, 10.0, 80.0]) color([0, 0.4, 1, 0.85]) cube([5, 5, 5]);
  translate([0.0, 15.0, 80.0]) color([0, 0.4, 1, 0.85]) cube([5, 5, 5]);
  translate([35.0, 15.0, 80.0]) color([0, 0.4, 1, 0.85]) cube([5, 5, 5]);
  translate([0.0, 20.0, 80.0]) color([0, 0.4, 1, 0.85]) cube([5, 5, 5]);
  translate([35.0, 20.0, 80.0]) color([0, 0.4, 1, 0.85]) cube([5, 5, 5]);
  translate([0.0, 25.0, 80.0]) color([0, 0.4, 1, 0.85]) cube([5, 5, 5]);
  translate([5.0, 25.0, 80.0]) color([0, 0.4, 1, 0.85]) cube([5, 5, 5]);
  translate([10.0, 25.0, 80.0]) color([0, 0.4, 1, 0.85]) cube([5, 5, 5]);
  translate([25.0, 25.0, 80.0]) color([0, 0.4, 1, 0.85]) cube([5, 5, 5]);
  translate([30.0, 25.0, 80.0]) color([0, 0.4, 1, 0.85]) cube([5, 5, 5]);
  translate([35.0, 25.0, 80.0]) color([0, 0.4, 1, 0.85]) cube([5, 5, 5]);
  translate([0.0, 30.0, 80.0]) color([0, 0.4, 1, 0.85]) cube([5, 5, 5]);
  translate([5.0, 30.0, 80.0]) color([0, 0.4, 1, 0.85]) cube([5, 5, 5]);
  translate([10.0, 30.0, 80.0]) color([0, 0.4, 1, 0.85]) cube([5, 5, 5]);
  translate([25.0, 30.0, 80.0]) color([0, 0.4, 1, 0.85]) cube([5, 5, 5]);
  translate([30.0, 30.0, 80.0]) color([0, 0.4, 1, 0.85]) cube([5, 5, 5]);
  translate([35.0, 30.0, 80.0]) color([0, 0.4, 1, 0.85]) cube([5, 5, 5]);
}
